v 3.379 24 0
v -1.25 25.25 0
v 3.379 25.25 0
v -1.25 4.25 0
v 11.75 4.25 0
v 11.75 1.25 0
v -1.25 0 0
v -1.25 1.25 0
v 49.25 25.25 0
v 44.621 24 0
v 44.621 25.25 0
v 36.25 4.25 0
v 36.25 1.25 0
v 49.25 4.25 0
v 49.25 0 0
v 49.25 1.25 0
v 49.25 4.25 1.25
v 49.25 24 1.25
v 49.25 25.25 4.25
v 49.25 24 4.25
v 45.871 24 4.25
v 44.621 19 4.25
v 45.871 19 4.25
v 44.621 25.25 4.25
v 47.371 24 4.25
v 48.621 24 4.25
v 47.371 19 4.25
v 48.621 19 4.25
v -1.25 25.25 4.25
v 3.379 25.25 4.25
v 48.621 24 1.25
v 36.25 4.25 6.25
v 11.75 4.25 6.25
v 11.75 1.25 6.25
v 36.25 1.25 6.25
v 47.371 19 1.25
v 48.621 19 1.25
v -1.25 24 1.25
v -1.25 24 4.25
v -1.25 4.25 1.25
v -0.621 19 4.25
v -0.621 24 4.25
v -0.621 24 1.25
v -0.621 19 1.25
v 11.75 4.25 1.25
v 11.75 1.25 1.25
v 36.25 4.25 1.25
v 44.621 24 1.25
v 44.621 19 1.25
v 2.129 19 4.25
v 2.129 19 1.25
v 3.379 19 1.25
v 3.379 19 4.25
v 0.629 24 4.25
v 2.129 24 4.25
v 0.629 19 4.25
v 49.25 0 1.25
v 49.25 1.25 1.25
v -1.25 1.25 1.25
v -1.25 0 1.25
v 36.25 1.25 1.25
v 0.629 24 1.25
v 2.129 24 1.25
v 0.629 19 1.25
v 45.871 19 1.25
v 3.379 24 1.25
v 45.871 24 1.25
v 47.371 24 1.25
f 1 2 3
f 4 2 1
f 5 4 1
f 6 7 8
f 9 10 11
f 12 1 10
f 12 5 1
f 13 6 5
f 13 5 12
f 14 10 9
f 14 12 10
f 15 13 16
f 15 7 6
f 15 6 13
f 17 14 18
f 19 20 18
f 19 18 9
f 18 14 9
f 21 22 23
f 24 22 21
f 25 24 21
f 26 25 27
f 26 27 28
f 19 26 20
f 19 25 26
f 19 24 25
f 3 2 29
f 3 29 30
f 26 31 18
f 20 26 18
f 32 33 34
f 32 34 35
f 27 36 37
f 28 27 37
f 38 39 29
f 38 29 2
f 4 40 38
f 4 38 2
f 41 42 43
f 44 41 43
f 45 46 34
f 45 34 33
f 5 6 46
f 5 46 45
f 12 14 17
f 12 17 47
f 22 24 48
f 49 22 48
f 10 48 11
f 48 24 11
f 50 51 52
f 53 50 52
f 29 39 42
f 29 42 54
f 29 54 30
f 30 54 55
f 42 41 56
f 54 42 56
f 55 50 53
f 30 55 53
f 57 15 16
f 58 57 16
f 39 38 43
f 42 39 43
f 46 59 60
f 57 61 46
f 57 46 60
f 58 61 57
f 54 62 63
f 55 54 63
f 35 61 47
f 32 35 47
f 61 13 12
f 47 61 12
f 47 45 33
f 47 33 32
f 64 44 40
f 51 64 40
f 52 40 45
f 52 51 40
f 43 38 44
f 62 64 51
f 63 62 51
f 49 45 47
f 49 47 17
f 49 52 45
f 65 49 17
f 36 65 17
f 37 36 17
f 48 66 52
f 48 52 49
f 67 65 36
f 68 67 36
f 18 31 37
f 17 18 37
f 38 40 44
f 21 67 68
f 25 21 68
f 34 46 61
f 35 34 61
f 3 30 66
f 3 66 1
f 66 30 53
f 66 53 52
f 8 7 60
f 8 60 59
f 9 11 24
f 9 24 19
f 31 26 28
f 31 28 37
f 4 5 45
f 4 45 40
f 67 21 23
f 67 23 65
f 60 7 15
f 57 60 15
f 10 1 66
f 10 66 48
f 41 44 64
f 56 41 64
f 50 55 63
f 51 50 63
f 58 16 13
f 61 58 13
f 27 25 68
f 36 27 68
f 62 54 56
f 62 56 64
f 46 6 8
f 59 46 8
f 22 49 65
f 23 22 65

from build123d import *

# Parameters (mm, degrees)
SKETCH1_W           = 50.5
SKETCH1_H           = 24
BOSS_EXTRUDE1_DEPTH = 1.25
SKETCH2_W           = 1.25
SKETCH2_H           = 3
BOSS_EXTRUDE2_DEPTH = 5
SKETCH3_W           = 13
SKETCH3_H           = 3
CUT_EXTRUDE1_DEPTH  = 1.25
SKETCH5_W           = 4.628536498
SKETCH5_H           = 4.25
BOSS_EXTRUDE3_DEPTH = 1.25
SKETCH9_W           = 24.5
SKETCH9_H           = 3
BOSS_EXTRUDE5_DEPTH = 5


with BuildPart() as part:
    # Sketch1 → Boss-Extrude1 (new body)
    with BuildSketch(Plane.XY):
        with Locations((24, 12)):
            Rectangle(SKETCH1_W, SKETCH1_H)
    extrude(amount=BOSS_EXTRUDE1_DEPTH)

    # Sketch2 → Boss-Extrude2 (add)
    with BuildSketch(Plane(origin=(0, 24, 0), x_dir=(1, 0, 0), z_dir=(0, 1, 0))):
        with Locations((47.996463502, -2.75)):
            Rectangle(SKETCH2_W, SKETCH2_H)
        with Locations((45.246463502, -2.75)):
            Rectangle(SKETCH2_W, SKETCH2_H)
        with Locations((2.753536498, -2.75)):
            Rectangle(SKETCH2_W, SKETCH2_H)
        with Locations((0.003536498, -2.75)):
            Rectangle(SKETCH2_W, SKETCH2_H)
    extrude(amount=-BOSS_EXTRUDE2_DEPTH)

    # Sketch3 → Cut-Extrude1 (cut)
    with BuildSketch(Plane(origin=(0, 0, 0), x_dir=(-1, 0, 0), z_dir=(0, 0, -1))):
        with Locations((-42.75, 2.75)):
            Rectangle(SKETCH3_W, SKETCH3_H)
        with Locations((-5.25, 2.75)):
            Rectangle(SKETCH3_W, SKETCH3_H)
    extrude(amount=-CUT_EXTRUDE1_DEPTH, mode=Mode.SUBTRACT)

    # Sketch5 → Boss-Extrude3 (add)
    with BuildSketch(Plane(origin=(0, 24, 0), x_dir=(1, 0, 0), z_dir=(0, 1, 0))):
        with Locations((1.064268249, -2.125)):
            Rectangle(SKETCH5_W, SKETCH5_H)
        with Locations((46.935731751, -2.125)):
            Rectangle(SKETCH5_W, SKETCH5_H)
    extrude(amount=BOSS_EXTRUDE3_DEPTH)

    # Sketch9 → Boss-Extrude5 (add)
    with BuildSketch(Plane.XY.offset(1.25)):
        with Locations((24, 2.75)):
            Rectangle(SKETCH9_W, SKETCH9_H)
    extrude(amount=BOSS_EXTRUDE5_DEPTH)


solid = part.part
